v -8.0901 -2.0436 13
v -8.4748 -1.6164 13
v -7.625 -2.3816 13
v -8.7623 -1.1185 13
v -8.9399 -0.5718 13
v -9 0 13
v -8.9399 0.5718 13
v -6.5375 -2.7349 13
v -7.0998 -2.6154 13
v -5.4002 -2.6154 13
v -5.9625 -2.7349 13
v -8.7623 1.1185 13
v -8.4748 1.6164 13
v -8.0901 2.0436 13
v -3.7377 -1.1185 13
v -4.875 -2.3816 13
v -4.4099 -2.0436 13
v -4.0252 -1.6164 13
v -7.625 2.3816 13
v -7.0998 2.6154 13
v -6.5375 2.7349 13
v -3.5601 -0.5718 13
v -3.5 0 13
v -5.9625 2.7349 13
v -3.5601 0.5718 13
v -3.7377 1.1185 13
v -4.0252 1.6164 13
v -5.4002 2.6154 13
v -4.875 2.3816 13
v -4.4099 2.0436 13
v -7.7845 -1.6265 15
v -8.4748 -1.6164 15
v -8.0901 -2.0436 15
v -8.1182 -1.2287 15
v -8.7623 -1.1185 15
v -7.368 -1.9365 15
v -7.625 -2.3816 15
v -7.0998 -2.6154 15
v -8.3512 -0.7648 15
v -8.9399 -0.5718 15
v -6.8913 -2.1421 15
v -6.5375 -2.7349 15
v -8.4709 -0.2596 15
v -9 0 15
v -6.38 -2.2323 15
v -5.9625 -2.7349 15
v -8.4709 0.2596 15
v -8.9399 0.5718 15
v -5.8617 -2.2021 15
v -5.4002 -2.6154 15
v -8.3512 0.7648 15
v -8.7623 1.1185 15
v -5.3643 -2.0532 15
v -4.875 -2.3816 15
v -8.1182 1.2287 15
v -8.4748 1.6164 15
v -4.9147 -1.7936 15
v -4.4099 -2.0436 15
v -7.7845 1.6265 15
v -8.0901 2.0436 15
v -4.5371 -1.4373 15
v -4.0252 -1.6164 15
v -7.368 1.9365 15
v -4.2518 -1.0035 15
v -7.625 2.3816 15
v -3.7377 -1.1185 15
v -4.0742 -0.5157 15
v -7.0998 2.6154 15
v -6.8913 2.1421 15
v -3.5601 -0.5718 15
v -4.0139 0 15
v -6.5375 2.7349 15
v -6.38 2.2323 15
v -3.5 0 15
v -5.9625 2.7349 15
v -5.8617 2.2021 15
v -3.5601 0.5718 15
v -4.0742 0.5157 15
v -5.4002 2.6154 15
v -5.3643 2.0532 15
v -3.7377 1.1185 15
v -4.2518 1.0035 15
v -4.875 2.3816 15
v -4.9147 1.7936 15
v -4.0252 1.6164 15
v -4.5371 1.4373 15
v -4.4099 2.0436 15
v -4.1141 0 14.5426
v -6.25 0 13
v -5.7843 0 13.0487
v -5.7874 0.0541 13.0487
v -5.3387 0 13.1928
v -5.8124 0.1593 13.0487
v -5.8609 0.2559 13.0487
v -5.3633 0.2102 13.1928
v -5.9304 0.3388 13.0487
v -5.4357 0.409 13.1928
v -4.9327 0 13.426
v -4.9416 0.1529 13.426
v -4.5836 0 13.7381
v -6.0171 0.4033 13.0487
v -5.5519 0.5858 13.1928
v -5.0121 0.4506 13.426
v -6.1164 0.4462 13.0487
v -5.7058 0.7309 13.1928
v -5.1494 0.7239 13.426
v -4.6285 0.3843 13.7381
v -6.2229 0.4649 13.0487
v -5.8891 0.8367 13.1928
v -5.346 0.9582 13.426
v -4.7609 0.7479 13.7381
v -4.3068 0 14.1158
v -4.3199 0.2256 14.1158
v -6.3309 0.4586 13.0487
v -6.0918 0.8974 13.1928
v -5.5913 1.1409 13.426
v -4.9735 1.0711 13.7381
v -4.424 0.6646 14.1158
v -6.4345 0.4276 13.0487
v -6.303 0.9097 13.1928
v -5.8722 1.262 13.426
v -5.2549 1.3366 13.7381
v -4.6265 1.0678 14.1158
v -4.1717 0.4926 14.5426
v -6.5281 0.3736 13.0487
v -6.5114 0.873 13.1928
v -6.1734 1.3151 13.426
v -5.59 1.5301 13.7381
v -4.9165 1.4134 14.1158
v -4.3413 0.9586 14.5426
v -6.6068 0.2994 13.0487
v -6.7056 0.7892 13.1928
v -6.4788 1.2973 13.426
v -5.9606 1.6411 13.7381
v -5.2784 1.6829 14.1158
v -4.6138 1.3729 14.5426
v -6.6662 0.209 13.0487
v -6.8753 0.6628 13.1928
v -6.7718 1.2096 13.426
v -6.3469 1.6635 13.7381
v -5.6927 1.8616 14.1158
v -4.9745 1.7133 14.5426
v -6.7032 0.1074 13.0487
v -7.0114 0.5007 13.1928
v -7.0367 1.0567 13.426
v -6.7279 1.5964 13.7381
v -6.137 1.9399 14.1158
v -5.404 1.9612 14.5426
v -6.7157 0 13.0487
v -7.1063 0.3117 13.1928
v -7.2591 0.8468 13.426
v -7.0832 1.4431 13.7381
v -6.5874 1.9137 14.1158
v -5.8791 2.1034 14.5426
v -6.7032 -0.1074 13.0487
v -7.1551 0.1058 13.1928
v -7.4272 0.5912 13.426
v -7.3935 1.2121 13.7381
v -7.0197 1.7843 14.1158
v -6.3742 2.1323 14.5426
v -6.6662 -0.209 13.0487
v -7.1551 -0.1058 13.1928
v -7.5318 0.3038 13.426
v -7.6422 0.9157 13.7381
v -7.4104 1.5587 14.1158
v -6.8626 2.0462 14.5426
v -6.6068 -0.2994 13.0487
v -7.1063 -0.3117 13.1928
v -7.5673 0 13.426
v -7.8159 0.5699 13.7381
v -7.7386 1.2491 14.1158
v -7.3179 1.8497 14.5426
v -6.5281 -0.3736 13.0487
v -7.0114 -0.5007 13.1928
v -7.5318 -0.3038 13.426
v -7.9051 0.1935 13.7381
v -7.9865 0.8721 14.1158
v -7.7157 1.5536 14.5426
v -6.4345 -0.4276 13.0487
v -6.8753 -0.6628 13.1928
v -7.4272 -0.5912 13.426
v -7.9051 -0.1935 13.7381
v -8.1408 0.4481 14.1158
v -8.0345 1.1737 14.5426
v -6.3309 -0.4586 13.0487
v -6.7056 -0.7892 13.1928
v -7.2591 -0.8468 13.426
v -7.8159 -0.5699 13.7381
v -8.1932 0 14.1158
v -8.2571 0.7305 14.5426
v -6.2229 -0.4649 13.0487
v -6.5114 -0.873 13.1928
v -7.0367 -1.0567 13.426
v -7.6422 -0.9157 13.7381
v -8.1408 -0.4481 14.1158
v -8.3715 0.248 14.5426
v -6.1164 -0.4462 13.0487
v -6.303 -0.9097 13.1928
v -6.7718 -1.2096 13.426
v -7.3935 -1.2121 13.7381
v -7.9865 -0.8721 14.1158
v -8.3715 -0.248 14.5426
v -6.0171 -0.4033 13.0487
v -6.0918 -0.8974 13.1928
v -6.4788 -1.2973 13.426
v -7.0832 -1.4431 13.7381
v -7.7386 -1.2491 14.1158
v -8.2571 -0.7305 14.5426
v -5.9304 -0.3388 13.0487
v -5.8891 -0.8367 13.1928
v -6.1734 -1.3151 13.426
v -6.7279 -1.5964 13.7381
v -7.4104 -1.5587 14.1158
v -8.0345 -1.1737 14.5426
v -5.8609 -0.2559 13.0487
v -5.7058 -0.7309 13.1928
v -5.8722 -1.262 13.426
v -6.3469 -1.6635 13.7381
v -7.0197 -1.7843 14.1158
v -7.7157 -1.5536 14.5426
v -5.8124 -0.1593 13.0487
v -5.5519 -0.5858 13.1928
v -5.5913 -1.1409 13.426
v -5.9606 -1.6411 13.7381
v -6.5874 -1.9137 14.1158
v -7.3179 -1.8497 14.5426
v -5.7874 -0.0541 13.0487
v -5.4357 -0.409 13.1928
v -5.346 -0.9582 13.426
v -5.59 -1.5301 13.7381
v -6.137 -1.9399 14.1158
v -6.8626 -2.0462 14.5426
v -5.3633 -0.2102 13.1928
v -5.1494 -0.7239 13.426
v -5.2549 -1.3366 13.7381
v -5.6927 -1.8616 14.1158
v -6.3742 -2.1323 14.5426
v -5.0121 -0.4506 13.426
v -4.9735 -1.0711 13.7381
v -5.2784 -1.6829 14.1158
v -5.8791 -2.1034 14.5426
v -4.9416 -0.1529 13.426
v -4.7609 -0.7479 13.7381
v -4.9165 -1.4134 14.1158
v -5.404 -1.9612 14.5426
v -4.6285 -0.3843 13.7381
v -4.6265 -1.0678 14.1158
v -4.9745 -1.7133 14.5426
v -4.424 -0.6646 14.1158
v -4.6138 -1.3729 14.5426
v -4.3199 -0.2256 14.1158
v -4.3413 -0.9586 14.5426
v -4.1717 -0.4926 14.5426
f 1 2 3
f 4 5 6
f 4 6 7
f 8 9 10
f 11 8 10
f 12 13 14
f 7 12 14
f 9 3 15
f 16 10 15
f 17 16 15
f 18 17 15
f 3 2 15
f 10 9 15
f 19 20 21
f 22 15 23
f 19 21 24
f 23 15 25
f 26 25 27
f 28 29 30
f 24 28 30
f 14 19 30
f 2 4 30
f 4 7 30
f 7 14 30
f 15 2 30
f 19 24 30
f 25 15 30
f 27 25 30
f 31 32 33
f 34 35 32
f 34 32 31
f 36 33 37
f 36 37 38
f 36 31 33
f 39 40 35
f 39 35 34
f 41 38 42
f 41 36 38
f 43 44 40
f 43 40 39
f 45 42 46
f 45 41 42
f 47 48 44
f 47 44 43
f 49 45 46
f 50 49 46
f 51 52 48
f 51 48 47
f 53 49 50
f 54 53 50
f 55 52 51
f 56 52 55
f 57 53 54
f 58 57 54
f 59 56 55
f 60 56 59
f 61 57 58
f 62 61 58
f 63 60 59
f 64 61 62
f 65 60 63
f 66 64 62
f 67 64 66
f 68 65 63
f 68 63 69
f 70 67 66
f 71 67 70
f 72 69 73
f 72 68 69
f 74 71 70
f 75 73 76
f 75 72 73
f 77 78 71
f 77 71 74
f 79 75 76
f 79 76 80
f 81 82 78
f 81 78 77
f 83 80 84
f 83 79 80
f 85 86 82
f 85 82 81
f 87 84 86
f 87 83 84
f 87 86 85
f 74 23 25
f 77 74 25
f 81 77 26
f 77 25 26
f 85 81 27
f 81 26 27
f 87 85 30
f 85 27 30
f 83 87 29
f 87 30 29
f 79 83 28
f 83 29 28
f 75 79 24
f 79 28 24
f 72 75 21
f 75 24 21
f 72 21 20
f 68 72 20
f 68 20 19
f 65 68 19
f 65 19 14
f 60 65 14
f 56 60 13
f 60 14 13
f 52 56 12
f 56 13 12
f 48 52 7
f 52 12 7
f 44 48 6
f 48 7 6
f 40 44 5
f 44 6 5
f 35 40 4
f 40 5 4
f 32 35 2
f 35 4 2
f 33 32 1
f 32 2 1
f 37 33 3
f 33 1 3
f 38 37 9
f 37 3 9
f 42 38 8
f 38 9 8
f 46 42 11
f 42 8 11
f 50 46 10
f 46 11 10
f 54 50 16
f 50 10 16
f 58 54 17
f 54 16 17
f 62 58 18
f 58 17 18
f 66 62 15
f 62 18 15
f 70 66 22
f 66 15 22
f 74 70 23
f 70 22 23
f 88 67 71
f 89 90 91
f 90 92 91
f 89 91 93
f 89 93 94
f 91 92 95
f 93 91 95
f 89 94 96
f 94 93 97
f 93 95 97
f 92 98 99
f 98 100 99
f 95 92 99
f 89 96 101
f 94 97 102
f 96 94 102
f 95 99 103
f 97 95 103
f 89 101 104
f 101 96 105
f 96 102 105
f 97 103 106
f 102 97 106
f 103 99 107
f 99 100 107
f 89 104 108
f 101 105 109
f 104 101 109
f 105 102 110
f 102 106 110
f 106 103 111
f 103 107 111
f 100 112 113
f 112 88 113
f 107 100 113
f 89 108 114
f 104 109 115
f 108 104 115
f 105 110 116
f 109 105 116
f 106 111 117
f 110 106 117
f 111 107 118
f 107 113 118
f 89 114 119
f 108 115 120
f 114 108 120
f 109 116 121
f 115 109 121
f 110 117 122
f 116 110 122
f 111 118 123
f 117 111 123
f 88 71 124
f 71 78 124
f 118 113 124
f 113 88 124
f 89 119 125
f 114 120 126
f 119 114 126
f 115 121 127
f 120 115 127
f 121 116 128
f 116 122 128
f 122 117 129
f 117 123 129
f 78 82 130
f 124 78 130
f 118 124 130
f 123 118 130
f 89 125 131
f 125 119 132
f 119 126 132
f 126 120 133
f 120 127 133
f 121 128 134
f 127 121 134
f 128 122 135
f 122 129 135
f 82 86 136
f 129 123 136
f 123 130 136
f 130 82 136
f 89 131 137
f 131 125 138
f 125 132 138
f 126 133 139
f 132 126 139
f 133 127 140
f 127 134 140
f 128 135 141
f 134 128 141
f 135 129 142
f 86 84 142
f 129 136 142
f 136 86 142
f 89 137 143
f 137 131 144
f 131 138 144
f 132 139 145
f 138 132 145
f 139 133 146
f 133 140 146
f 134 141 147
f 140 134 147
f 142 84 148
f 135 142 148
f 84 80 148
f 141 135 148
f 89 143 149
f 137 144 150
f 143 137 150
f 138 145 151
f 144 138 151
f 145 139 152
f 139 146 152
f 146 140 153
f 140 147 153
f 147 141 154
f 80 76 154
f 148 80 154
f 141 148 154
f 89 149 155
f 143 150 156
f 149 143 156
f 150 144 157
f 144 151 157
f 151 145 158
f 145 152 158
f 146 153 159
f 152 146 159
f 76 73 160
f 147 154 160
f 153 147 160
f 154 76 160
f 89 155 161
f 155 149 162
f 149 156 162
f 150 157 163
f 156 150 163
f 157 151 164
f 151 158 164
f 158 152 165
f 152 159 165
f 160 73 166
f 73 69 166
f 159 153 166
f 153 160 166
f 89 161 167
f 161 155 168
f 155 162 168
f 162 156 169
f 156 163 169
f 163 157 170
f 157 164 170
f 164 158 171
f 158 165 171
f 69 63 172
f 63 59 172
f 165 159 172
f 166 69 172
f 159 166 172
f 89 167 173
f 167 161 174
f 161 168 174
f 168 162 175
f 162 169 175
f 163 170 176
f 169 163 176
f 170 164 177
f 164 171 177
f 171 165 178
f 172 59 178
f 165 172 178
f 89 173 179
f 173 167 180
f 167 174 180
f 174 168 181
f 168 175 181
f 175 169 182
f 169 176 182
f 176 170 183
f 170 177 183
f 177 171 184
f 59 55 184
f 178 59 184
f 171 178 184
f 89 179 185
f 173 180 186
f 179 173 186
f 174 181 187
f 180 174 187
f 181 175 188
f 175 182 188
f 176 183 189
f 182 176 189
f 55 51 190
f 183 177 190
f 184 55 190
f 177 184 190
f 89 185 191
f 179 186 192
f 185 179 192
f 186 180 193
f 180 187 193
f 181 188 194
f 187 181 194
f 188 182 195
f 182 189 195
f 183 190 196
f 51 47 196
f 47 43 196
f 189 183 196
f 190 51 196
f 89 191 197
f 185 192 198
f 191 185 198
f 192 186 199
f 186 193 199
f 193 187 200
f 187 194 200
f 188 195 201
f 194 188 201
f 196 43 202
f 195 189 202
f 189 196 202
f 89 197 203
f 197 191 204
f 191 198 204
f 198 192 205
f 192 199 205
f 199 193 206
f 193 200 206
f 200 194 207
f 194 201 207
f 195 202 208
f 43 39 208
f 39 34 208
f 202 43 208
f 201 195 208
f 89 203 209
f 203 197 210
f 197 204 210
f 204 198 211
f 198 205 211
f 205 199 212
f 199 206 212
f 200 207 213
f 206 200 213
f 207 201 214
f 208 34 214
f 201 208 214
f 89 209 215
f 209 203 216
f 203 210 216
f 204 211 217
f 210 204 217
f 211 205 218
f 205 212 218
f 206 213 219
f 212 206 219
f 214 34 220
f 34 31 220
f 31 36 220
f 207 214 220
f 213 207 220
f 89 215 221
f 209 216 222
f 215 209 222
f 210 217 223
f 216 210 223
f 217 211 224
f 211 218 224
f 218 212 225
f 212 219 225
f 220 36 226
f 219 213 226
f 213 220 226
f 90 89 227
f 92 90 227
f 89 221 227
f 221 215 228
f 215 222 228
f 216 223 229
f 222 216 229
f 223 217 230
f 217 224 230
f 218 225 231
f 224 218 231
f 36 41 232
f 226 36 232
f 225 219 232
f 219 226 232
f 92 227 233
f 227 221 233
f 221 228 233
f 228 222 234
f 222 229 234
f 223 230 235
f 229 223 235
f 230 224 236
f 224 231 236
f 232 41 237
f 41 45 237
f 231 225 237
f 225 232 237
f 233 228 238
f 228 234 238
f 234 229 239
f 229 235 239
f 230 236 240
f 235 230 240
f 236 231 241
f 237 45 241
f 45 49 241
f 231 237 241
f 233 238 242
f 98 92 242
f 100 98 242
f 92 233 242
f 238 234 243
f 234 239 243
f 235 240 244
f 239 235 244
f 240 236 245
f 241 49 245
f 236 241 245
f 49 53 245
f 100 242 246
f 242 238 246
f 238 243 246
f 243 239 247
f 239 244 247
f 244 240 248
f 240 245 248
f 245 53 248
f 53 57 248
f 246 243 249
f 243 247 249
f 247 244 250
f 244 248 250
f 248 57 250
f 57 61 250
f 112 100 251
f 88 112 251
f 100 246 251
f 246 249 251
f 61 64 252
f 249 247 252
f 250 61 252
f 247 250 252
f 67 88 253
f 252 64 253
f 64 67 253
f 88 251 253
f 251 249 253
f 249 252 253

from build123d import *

# Parameters (mm, degrees)
CYLINDER006_R     = 2.75
CYLINDER006_DEPTH = 2


with BuildPart() as sphere005:
    # Sphere005 → Sphere005 (revolve)
    with BuildSketch(Plane(origin=(-6.25, 0, 15.25), x_dir=(1, 0, 0), z_dir=(0, -1, 0))):
        with BuildLine():
            ThreePointArc((0, -2.25), (2.25, 0), (0, 2.25))
            Line((0, 2.25), (0, -2.25))
        make_face()
    revolve(axis=Axis((-6.25, 0, 15.25), (0, 0, 1)))


with BuildPart() as cut003:
    # Cylinder006 → Cylinder006 (new body)
    with BuildSketch(Plane(origin=(-6.25, 0, 13), x_dir=(1, 0, 0), z_dir=(0, 0, 1))):
        Circle(CYLINDER006_R)
    extrude(amount=CYLINDER006_DEPTH)

    # Cut003: cut Sphere005
    add(sphere005.part, mode=Mode.SUBTRACT)


solid = cut003.part
